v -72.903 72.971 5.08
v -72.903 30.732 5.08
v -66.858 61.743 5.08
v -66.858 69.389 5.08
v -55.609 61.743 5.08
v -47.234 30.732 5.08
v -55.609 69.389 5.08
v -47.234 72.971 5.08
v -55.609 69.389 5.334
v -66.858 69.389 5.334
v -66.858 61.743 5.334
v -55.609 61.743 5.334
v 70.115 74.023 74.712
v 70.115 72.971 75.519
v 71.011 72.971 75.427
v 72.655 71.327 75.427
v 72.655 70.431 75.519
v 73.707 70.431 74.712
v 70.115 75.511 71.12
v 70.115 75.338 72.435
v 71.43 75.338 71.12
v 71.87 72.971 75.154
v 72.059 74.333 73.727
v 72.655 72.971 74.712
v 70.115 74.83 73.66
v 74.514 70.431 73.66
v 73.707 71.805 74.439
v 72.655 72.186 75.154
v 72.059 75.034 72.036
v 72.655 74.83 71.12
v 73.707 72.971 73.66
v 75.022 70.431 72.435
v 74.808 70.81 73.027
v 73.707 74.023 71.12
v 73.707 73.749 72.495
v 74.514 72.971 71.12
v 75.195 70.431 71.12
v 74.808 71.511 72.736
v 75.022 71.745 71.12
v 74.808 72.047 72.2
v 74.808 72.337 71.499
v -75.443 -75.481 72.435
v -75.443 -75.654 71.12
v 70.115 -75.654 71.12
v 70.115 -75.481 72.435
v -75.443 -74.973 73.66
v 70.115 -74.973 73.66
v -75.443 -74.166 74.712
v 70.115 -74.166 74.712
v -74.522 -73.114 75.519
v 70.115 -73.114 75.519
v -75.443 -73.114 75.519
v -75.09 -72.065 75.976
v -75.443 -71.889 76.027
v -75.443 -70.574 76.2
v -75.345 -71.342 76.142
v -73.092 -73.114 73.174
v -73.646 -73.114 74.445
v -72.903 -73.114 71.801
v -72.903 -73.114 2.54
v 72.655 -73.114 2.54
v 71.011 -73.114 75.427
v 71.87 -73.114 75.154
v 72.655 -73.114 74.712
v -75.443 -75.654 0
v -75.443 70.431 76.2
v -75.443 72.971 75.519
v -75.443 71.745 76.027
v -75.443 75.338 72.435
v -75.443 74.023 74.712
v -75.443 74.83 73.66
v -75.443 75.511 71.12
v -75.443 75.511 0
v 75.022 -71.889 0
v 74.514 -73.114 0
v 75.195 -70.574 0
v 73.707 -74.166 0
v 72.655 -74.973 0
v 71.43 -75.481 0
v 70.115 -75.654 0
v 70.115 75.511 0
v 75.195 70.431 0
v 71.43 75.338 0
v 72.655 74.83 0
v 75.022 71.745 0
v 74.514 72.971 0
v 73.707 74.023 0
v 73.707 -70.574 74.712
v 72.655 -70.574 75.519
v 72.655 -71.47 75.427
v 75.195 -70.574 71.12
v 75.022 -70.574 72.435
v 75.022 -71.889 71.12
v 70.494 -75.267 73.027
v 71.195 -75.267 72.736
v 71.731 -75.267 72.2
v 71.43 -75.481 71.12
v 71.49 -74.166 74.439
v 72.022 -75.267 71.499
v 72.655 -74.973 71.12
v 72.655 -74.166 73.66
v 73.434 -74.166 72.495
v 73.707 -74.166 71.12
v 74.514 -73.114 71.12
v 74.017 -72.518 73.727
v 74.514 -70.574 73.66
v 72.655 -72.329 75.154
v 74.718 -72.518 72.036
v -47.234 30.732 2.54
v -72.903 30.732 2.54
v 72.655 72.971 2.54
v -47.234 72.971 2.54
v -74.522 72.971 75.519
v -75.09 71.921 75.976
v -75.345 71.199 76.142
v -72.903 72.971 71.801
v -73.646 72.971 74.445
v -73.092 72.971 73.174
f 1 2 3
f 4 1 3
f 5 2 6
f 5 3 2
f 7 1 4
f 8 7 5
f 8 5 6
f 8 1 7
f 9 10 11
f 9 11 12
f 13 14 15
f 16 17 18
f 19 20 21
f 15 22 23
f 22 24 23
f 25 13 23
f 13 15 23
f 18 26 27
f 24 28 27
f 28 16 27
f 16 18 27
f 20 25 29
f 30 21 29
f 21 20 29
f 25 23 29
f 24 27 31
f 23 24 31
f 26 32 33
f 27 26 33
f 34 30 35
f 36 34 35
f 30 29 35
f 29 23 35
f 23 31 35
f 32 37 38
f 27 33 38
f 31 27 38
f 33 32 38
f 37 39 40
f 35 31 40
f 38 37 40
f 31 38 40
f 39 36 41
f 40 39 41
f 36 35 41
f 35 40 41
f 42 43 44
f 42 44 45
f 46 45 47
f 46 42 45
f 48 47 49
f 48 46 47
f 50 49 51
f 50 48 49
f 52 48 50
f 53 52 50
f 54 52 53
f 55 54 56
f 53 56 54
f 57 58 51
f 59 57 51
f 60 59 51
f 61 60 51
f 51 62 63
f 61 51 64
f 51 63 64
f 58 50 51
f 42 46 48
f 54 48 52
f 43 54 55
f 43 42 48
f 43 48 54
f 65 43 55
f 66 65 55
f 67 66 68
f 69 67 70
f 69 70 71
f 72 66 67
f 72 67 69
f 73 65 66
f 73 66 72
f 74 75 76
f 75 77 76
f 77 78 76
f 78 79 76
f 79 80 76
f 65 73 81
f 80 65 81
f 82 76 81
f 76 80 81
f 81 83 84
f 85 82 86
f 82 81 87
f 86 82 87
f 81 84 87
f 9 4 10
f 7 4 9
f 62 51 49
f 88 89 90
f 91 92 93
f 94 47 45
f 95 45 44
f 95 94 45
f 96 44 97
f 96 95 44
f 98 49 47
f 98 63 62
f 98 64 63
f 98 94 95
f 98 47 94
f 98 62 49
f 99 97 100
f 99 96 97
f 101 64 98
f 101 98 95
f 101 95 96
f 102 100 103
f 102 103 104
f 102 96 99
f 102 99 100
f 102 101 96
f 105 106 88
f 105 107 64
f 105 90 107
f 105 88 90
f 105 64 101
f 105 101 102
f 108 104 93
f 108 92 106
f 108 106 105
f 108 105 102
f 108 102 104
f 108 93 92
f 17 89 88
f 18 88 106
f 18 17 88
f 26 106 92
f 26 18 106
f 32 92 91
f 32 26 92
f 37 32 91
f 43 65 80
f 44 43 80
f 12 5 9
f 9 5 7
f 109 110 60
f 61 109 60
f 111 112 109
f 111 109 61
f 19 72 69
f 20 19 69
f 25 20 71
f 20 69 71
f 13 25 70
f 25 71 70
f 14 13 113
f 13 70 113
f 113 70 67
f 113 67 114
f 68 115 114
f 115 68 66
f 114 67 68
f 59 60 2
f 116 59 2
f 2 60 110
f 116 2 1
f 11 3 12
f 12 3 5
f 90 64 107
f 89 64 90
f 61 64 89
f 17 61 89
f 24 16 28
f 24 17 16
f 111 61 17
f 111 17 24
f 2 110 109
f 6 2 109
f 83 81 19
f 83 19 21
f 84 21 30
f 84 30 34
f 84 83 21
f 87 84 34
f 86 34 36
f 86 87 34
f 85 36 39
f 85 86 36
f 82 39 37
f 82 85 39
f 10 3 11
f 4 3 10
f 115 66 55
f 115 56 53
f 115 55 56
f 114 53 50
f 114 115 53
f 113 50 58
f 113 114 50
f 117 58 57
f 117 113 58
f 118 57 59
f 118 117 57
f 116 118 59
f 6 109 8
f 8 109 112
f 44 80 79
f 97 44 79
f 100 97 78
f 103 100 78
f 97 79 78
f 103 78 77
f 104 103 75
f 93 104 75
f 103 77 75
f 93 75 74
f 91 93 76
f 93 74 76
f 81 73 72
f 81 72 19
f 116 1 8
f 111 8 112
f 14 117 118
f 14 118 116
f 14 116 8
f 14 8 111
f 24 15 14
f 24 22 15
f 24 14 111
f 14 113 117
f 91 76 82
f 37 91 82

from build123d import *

# Parameters (mm, degrees)
F0_W        = 150.6382748485
F0_H        = 151.164598763
F1_DEPTH    = 76.2
F2_T        = -2.54
F3_T1_DEPTH = 176.0382748485
F4_T1_DEPTH = 158.784598763
F4_T3_DEPTH = 83.82
F4_T6_ANGLE = 89.9999999979
F5_T1_DEPTH = 158.2582748485
F5_T3_DEPTH = 83.82
F5_T6_ANGLE = 89.9999999979
F6_T4_DEPTH = 163.0016440191
F7_W        = 25.6696862793
F7_H        = 42.238175652
F8_DEPTH    = 2.54
F9_W        = 11.248614639
F9_H        = 7.6456852257
F10_DEPTH   = 0.254


# Not quite as in the source:
# - a fillet or chamfer that OpenCascade refuses, or shapes differently, is made with other operations: its cross-section is extruded or revolved along the edge and cut away or added


with BuildPart() as f1:
    # F0 (on Top) → F1 (new body)
    with BuildSketch(Plane.XY):
        with Locations((-0.1240856946, -0.0716410577)):
            Rectangle(F0_W, F0_H)
    extrude(amount=F1_DEPTH)

    # F2
    f2_openings = [f1.faces().sort_by_distance(p)[0] for p in [
        (-0.124086, -0.071641, 76.2),
    ]]
    offset(amount=F2_T, openings=f2_openings)

    # F3: fillet of radius 5.08 on 1 edges, made by hand

    # F3_s2 → F3_t1 (cut)
    with BuildSketch(Plane.YZ.offset(-88.1432231188)):
        with BuildLine():
            ThreePointArc((75.5106583238, 71.12), (74.0227607722, 74.7121024484), (70.4306583238, 76.2))
            Line((70.4306583238, 76.2), (75.5106583238, 76.2))
            Line((75.5106583238, 76.2), (75.5106583238, 71.12))
        make_face()
    extrude(amount=F3_T1_DEPTH, mode=Mode.SUBTRACT)

    # F4: fillet of radius 5.08 on 1 edges, made by hand

    # F4_s2 → F4_t1 (cut)
    with BuildSketch(Plane.XZ.offset(-70.4306583238)):
        with BuildLine():
            ThreePointArc((70.1150517297, 76.2), (73.7071541781, 74.7121024484), (75.1950517297, 71.12))
            Line((75.1950517297, 71.12), (75.1950517297, 76.2))
            Line((75.1950517297, 76.2), (70.1150517297, 76.2))
        make_face()
    extrude(amount=F4_T1_DEPTH, mode=Mode.SUBTRACT)

    # F4_s4 → F4_t3 (cut)
    with BuildSketch(Plane.XY.offset(-12.7)):
        with BuildLine():
            ThreePointArc((70.1150517297, 75.5106583238), (73.7071541781, 74.0227607722), (75.1950517297, 70.4306583238))
            Line((75.1950517297, 70.4306583238), (75.1950517297, 75.5106583238))
            Line((75.1950517297, 75.5106583238), (70.1150517297, 75.5106583238))
        make_face()
    extrude(amount=F4_T3_DEPTH, mode=Mode.SUBTRACT)

    # F4_s5 → F4_t6 (revolve, cut)
    with BuildSketch(Plane.XZ.offset(-70.4306583237)):
        with BuildLine():
            ThreePointArc((70.1150517297, 76.2), (73.7071541781, 74.7121024484), (75.1950517297, 71.12))
            Line((75.1950517297, 71.12), (75.1950517297, 76.2))
            Line((75.1950517297, 76.2), (70.1150517297, 76.2))
        make_face()
    revolve(axis=Axis((75.1950517297, 70.4306583237, 71.1199999999), (-1, 0, 0)), revolution_arc=F4_T6_ANGLE, mode=Mode.SUBTRACT)

    # F5: fillet of radius 5.08 on 1 edges, made by hand

    # F5_s2 → F5_t1 (cut)
    with BuildSketch(Plane.YZ.offset(-88.1432231188)):
        with BuildLine():
            ThreePointArc((-75.6539404392, 71.12), (-74.1660428877, 74.7121024484), (-70.5739404392, 76.2))
            Line((-70.5739404392, 76.2), (-75.6539404392, 76.2))
            Line((-75.6539404392, 76.2), (-75.6539404392, 71.12))
        make_face()
    extrude(amount=F5_T1_DEPTH, mode=Mode.SUBTRACT)

    # F5_s4 → F5_t3 (cut)
    with BuildSketch(Plane.XY.offset(-12.7)):
        with BuildLine():
            ThreePointArc((70.1150517297, -75.6539404392), (73.7071541781, -74.1660428877), (75.1950517297, -70.5739404392))
            Line((75.1950517297, -70.5739404392), (75.1950517297, -75.6539404392))
            Line((75.1950517297, -75.6539404392), (70.1150517297, -75.6539404392))
        make_face()
    extrude(amount=F5_T3_DEPTH, mode=Mode.SUBTRACT)

    # F5_s5 → F5_t6 (revolve, cut)
    with BuildSketch(Plane.YZ.offset(70.1150517296)):
        with BuildLine():
            ThreePointArc((-75.6539404392, 71.12), (-74.1660428877, 74.7121024484), (-70.5739404392, 76.2))
            Line((-70.5739404392, 76.2), (-75.6539404392, 76.2))
            Line((-75.6539404392, 76.2), (-75.6539404392, 71.12))
        make_face()
    revolve(axis=Axis((70.1150517296, -75.6539404392, 71.1199999999), (0, 1, 0)), revolution_arc=F5_T6_ANGLE, mode=Mode.SUBTRACT)

    # F6: fillet of radius 5.08 on 1 edges, made by hand


with BuildPart() as f6_tool2:
    # F6_s3 → F6_t4 (new body)
    with BuildSketch(Plane.XZ.offset(-81.4291809519)):
        with BuildLine():
            ThreePointArc((-75.4432231188, 76.2), (-73.5838140676, 74.3405909488), (-72.9032231188, 71.8005909488))
            Line((-72.9032231188, 71.8005909488), (-72.9032231188, 76.2))
            Line((-72.9032231188, 76.2), (-75.4432231188, 76.2))
        make_face()
    extrude(amount=F6_T4_DEPTH)

    split(bisect_by=Plane.XZ.offset(73.1139404392), keep=Keep.BOTTOM)

    split(bisect_by=Plane.XZ.offset(-72.9706583238), keep=Keep.TOP)


with BuildPart() as f1_1:
    add(f1.part)

    # F6_t1: cut F6_tool2
    add(f6_tool2.part, mode=Mode.SUBTRACT)

    # F7 (on face) → F8 (join)
    with BuildSketch(Plane.XY.offset(2.54)):
        with Locations((-60.0683799791, 51.8515704978)):
            Rectangle(F7_W, F7_H)
    extrude(amount=F8_DEPTH)

    # F9 (on face) → F10 (join)
    with BuildSketch(Plane.XY.offset(5.08)):
        with Locations((-61.2332168967, 65.5658598989)):
            Rectangle(F9_W, F9_H)
    extrude(amount=F10_DEPTH)


solid = f1_1.part
